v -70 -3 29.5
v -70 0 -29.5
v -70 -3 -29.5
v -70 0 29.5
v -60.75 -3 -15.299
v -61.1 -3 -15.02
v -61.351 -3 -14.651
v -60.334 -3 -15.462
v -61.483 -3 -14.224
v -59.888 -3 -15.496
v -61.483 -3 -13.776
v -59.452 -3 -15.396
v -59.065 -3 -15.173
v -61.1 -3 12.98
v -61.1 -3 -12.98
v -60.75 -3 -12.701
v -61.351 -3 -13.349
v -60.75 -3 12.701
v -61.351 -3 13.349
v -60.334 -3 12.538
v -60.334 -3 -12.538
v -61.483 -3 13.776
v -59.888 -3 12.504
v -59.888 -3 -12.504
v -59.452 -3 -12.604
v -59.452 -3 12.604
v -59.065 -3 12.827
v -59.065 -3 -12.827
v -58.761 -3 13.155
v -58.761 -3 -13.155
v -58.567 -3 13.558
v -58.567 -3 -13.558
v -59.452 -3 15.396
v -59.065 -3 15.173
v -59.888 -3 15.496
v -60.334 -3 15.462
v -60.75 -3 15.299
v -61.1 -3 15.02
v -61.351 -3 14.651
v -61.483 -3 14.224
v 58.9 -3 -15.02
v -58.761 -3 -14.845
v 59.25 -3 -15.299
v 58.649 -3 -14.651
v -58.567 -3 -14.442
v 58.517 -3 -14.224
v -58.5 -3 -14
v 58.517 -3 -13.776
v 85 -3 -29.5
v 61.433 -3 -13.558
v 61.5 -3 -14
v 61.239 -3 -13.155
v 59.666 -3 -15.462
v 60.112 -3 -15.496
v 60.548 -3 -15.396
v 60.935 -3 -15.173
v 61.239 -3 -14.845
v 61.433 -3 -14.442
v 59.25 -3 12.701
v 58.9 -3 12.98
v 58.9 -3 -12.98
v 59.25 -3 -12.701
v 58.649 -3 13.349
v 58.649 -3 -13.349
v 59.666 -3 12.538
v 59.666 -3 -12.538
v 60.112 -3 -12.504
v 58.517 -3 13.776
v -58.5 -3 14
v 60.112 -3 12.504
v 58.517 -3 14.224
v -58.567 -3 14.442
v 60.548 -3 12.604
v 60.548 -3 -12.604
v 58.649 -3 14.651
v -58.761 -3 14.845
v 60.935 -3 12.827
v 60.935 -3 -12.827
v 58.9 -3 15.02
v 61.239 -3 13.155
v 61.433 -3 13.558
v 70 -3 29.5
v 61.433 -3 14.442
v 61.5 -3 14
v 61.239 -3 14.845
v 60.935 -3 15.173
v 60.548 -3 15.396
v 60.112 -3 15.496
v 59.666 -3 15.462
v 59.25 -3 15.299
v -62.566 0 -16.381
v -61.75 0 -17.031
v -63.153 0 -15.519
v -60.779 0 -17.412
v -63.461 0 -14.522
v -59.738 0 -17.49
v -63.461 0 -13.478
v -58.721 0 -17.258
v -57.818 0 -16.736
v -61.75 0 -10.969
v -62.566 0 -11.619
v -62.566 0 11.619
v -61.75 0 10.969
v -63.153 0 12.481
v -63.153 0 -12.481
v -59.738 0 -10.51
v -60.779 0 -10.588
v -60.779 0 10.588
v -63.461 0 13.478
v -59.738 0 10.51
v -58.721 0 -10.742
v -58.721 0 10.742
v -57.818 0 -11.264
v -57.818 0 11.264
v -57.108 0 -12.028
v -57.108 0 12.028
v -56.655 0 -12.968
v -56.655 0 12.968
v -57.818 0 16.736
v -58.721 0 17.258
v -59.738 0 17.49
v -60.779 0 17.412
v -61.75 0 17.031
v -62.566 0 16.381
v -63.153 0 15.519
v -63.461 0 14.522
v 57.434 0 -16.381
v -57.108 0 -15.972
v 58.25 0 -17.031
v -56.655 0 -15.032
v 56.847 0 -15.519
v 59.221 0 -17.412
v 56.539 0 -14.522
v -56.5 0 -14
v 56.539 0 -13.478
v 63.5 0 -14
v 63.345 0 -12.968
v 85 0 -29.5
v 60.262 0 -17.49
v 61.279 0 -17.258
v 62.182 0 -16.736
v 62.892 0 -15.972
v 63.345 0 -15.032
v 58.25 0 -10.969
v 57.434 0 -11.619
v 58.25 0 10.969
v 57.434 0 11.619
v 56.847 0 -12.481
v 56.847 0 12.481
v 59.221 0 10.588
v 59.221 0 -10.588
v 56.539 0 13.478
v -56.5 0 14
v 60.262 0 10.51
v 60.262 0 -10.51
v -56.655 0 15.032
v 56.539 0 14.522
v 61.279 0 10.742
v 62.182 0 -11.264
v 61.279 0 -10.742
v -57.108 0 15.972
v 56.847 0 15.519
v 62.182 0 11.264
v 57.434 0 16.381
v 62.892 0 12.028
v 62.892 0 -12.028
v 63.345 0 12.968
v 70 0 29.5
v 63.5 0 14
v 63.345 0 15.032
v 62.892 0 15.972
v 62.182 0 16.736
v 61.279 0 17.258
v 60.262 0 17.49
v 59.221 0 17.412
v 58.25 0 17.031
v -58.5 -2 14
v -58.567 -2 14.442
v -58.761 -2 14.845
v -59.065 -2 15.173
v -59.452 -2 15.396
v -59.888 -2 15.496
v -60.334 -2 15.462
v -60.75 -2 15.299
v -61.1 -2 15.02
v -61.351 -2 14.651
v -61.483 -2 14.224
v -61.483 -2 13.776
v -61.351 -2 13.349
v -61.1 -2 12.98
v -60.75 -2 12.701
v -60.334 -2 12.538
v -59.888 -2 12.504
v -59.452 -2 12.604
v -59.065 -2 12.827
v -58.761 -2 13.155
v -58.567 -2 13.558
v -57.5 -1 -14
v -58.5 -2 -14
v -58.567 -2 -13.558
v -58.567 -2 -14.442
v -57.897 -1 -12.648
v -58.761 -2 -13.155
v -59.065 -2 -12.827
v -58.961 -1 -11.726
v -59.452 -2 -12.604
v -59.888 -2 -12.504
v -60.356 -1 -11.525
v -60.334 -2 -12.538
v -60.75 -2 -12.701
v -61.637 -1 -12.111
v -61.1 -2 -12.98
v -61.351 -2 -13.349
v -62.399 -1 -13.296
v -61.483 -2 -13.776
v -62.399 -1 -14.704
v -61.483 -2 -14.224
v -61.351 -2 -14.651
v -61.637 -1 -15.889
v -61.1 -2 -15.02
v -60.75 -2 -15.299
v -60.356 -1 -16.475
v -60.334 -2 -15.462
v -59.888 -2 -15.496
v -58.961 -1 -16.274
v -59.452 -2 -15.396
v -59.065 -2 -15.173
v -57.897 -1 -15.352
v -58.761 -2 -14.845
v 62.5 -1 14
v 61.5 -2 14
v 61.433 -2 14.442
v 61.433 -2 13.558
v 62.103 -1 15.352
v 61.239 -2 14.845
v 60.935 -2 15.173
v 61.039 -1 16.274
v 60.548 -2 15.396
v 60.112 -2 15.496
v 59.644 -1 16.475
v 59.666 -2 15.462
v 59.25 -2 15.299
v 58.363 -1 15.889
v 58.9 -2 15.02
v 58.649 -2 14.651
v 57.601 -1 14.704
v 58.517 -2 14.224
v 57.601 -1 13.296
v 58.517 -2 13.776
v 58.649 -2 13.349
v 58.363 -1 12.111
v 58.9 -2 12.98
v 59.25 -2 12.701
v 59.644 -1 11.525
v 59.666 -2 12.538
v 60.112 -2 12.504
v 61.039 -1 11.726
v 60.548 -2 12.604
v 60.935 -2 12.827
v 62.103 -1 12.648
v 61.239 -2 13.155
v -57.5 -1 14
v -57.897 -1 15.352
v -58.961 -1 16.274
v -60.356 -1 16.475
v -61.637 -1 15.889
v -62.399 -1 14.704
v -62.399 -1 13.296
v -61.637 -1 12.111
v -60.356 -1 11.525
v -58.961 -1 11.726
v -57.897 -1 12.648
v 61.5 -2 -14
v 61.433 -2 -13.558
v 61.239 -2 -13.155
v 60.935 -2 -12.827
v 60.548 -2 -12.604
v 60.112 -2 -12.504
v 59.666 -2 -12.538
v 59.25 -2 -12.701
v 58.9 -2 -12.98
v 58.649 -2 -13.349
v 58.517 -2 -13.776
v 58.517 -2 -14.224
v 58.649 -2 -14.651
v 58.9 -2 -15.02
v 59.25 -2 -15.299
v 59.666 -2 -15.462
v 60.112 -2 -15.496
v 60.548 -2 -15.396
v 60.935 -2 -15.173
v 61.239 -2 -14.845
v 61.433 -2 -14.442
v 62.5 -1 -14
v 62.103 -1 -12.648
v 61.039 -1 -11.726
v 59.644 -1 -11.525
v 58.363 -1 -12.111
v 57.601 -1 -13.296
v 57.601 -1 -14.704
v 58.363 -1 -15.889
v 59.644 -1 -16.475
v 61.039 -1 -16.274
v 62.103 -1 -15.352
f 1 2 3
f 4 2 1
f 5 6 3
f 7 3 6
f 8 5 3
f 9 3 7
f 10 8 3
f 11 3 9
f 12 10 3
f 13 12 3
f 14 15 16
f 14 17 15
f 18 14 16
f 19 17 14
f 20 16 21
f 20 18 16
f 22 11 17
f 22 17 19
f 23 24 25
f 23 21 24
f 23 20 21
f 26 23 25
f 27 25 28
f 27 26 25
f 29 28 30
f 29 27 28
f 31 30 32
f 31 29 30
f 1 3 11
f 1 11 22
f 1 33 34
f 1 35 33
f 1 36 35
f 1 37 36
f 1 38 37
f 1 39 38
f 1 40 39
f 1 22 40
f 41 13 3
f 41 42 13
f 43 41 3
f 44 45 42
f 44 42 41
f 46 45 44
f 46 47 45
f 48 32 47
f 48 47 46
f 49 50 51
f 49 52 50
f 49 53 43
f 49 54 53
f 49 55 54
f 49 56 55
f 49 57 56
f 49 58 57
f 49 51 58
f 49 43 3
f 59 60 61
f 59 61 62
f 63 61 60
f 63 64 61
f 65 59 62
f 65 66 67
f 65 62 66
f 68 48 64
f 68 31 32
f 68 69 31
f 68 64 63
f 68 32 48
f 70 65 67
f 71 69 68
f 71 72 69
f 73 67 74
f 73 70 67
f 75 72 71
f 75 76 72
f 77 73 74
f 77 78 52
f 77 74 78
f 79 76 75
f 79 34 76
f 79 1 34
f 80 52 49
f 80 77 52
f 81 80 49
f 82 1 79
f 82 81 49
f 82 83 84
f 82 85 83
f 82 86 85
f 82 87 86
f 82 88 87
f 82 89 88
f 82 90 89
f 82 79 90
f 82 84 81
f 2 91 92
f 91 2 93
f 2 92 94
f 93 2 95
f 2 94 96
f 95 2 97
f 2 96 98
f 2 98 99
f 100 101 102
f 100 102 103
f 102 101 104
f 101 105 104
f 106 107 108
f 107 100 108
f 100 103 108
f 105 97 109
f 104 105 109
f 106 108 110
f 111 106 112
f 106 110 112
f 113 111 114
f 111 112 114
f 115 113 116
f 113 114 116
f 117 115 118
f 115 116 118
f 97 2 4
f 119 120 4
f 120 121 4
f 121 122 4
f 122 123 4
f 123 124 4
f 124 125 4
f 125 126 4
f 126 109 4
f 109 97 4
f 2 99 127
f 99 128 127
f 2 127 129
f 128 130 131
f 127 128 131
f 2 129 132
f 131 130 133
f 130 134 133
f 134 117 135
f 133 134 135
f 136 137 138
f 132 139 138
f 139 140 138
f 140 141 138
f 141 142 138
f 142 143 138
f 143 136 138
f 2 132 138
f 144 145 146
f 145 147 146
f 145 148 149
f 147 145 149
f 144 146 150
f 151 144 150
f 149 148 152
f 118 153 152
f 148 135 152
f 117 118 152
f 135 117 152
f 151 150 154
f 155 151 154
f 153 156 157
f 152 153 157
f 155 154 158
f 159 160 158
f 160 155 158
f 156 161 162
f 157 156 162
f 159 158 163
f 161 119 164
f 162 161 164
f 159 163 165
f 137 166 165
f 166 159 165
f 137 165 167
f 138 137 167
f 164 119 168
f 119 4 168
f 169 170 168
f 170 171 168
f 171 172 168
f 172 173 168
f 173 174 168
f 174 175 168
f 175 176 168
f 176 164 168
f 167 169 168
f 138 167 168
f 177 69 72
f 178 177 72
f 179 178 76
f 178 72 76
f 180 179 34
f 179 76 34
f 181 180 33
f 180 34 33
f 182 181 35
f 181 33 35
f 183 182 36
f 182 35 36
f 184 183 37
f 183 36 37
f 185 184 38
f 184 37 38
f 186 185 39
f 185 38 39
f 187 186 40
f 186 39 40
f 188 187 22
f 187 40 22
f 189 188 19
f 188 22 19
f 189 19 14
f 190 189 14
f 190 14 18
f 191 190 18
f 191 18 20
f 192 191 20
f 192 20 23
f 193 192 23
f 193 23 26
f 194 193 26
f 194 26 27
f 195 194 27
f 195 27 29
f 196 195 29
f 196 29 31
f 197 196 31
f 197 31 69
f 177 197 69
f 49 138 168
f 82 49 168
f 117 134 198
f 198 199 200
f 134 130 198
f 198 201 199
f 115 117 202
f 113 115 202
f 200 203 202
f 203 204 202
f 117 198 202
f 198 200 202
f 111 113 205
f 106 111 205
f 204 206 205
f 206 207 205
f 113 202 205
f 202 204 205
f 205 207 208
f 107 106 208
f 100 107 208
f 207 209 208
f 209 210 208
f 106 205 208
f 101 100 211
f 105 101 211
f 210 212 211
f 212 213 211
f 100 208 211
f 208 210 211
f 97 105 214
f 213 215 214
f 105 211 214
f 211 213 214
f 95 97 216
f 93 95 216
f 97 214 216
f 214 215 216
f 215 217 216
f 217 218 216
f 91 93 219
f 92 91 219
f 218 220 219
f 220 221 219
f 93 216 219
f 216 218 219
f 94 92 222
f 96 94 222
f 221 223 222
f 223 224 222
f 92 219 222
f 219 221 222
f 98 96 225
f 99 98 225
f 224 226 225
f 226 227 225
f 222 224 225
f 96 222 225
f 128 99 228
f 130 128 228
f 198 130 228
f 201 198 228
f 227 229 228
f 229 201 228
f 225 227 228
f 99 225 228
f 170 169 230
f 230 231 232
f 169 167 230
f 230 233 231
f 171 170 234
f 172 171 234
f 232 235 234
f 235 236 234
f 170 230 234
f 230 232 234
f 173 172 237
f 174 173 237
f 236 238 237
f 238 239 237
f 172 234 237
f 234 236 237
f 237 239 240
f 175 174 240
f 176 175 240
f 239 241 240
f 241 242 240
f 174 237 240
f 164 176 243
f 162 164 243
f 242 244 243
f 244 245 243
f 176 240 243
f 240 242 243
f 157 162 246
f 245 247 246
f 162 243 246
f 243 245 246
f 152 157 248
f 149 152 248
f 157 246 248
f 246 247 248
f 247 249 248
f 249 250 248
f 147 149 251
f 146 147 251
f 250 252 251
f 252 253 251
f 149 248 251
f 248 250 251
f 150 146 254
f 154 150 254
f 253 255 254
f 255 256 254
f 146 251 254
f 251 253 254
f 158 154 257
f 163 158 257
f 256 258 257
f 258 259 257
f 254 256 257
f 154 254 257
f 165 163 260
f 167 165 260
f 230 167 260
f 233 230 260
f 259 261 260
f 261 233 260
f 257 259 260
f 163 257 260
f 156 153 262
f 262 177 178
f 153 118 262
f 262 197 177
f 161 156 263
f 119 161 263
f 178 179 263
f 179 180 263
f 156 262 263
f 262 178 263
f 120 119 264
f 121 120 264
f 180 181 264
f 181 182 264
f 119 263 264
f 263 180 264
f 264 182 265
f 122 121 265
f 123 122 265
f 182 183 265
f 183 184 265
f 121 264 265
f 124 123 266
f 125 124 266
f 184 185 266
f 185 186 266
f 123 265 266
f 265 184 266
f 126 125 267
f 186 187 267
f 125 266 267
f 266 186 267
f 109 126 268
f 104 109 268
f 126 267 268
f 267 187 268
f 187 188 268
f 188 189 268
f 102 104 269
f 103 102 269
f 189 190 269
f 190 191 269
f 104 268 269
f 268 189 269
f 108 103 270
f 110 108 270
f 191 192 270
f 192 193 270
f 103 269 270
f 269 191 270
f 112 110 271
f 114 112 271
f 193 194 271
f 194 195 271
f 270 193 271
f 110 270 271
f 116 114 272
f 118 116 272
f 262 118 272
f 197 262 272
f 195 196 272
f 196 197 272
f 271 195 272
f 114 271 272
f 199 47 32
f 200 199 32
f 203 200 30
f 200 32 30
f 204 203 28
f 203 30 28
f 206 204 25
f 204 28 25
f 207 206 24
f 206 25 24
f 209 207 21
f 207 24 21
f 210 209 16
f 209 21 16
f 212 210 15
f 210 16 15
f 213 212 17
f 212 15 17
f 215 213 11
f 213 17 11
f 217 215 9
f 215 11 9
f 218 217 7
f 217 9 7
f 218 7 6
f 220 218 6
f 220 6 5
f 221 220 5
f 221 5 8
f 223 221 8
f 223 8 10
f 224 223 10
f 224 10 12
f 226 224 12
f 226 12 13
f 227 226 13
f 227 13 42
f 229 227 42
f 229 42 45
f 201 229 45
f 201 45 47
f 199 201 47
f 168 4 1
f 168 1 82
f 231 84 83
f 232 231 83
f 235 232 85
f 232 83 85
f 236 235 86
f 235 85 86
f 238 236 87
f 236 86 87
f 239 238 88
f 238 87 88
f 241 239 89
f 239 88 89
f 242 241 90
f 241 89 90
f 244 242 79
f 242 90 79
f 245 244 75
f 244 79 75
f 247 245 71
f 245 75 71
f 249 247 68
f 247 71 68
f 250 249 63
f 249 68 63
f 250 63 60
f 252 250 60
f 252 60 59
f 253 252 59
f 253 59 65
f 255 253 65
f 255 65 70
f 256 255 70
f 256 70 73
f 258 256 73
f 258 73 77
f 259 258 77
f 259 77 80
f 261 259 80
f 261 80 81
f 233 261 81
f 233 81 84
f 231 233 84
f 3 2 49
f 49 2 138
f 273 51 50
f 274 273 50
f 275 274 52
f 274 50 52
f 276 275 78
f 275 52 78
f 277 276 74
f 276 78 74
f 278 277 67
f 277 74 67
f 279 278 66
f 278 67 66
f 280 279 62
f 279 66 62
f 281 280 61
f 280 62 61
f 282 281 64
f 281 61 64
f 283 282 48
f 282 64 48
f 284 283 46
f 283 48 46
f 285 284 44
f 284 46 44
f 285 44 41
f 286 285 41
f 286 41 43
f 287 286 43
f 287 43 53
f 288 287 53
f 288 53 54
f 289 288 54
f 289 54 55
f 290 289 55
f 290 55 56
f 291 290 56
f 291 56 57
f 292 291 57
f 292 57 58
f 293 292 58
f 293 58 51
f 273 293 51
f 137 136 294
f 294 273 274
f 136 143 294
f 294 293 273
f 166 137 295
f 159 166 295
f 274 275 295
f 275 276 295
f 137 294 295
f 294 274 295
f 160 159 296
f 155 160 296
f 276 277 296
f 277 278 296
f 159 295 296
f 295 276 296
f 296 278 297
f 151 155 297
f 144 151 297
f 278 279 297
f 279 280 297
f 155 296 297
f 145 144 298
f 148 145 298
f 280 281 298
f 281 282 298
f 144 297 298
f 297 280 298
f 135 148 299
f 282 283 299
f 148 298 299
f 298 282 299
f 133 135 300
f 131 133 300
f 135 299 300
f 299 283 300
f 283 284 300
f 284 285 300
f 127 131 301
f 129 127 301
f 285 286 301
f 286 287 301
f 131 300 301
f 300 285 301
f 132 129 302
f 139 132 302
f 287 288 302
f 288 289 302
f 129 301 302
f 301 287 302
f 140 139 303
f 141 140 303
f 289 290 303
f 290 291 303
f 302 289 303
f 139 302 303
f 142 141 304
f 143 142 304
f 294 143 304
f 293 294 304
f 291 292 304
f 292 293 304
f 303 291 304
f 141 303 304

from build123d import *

# Parameters (mm, degrees)
F0_W     = 140
F0_H     = 59
F1_DEPTH = 3
F2_R     = 1.5
F3_DEPTH = 25
F4_SIZE  = 2


with BuildPart() as f1:
    # F0 (on Front) → F1 (new body)
    with BuildSketch(Plane.XZ):
        Rectangle(F0_W, F0_H)
        Polygon((85, -29.5), (70, 29.5), (70, -29.5), align=None)
    extrude(amount=F1_DEPTH)

    # F2 (on face) → F3 (cut)
    with BuildSketch(Plane.XZ.offset(3)):
        with Locations((-60, 14)):
            Circle(F2_R)
        with Locations((60, 14)):
            Circle(F2_R)
        with Locations((60, -14)):
            Circle(F2_R)
        with Locations((-60, -14)):
            Circle(F2_R)
    extrude(amount=-F3_DEPTH, mode=Mode.SUBTRACT)

    # F4
    f4_edges = [f1.edges().sort_by_distance(p)[0] for p in [
        (-61.5, 0, -14),
        (-61.5, 0, 14),
        (58.5, 0, -14),
        (58.5, 0, 14),
    ]]
    chamfer(f4_edges, length=F4_SIZE)


solid = f1.part
